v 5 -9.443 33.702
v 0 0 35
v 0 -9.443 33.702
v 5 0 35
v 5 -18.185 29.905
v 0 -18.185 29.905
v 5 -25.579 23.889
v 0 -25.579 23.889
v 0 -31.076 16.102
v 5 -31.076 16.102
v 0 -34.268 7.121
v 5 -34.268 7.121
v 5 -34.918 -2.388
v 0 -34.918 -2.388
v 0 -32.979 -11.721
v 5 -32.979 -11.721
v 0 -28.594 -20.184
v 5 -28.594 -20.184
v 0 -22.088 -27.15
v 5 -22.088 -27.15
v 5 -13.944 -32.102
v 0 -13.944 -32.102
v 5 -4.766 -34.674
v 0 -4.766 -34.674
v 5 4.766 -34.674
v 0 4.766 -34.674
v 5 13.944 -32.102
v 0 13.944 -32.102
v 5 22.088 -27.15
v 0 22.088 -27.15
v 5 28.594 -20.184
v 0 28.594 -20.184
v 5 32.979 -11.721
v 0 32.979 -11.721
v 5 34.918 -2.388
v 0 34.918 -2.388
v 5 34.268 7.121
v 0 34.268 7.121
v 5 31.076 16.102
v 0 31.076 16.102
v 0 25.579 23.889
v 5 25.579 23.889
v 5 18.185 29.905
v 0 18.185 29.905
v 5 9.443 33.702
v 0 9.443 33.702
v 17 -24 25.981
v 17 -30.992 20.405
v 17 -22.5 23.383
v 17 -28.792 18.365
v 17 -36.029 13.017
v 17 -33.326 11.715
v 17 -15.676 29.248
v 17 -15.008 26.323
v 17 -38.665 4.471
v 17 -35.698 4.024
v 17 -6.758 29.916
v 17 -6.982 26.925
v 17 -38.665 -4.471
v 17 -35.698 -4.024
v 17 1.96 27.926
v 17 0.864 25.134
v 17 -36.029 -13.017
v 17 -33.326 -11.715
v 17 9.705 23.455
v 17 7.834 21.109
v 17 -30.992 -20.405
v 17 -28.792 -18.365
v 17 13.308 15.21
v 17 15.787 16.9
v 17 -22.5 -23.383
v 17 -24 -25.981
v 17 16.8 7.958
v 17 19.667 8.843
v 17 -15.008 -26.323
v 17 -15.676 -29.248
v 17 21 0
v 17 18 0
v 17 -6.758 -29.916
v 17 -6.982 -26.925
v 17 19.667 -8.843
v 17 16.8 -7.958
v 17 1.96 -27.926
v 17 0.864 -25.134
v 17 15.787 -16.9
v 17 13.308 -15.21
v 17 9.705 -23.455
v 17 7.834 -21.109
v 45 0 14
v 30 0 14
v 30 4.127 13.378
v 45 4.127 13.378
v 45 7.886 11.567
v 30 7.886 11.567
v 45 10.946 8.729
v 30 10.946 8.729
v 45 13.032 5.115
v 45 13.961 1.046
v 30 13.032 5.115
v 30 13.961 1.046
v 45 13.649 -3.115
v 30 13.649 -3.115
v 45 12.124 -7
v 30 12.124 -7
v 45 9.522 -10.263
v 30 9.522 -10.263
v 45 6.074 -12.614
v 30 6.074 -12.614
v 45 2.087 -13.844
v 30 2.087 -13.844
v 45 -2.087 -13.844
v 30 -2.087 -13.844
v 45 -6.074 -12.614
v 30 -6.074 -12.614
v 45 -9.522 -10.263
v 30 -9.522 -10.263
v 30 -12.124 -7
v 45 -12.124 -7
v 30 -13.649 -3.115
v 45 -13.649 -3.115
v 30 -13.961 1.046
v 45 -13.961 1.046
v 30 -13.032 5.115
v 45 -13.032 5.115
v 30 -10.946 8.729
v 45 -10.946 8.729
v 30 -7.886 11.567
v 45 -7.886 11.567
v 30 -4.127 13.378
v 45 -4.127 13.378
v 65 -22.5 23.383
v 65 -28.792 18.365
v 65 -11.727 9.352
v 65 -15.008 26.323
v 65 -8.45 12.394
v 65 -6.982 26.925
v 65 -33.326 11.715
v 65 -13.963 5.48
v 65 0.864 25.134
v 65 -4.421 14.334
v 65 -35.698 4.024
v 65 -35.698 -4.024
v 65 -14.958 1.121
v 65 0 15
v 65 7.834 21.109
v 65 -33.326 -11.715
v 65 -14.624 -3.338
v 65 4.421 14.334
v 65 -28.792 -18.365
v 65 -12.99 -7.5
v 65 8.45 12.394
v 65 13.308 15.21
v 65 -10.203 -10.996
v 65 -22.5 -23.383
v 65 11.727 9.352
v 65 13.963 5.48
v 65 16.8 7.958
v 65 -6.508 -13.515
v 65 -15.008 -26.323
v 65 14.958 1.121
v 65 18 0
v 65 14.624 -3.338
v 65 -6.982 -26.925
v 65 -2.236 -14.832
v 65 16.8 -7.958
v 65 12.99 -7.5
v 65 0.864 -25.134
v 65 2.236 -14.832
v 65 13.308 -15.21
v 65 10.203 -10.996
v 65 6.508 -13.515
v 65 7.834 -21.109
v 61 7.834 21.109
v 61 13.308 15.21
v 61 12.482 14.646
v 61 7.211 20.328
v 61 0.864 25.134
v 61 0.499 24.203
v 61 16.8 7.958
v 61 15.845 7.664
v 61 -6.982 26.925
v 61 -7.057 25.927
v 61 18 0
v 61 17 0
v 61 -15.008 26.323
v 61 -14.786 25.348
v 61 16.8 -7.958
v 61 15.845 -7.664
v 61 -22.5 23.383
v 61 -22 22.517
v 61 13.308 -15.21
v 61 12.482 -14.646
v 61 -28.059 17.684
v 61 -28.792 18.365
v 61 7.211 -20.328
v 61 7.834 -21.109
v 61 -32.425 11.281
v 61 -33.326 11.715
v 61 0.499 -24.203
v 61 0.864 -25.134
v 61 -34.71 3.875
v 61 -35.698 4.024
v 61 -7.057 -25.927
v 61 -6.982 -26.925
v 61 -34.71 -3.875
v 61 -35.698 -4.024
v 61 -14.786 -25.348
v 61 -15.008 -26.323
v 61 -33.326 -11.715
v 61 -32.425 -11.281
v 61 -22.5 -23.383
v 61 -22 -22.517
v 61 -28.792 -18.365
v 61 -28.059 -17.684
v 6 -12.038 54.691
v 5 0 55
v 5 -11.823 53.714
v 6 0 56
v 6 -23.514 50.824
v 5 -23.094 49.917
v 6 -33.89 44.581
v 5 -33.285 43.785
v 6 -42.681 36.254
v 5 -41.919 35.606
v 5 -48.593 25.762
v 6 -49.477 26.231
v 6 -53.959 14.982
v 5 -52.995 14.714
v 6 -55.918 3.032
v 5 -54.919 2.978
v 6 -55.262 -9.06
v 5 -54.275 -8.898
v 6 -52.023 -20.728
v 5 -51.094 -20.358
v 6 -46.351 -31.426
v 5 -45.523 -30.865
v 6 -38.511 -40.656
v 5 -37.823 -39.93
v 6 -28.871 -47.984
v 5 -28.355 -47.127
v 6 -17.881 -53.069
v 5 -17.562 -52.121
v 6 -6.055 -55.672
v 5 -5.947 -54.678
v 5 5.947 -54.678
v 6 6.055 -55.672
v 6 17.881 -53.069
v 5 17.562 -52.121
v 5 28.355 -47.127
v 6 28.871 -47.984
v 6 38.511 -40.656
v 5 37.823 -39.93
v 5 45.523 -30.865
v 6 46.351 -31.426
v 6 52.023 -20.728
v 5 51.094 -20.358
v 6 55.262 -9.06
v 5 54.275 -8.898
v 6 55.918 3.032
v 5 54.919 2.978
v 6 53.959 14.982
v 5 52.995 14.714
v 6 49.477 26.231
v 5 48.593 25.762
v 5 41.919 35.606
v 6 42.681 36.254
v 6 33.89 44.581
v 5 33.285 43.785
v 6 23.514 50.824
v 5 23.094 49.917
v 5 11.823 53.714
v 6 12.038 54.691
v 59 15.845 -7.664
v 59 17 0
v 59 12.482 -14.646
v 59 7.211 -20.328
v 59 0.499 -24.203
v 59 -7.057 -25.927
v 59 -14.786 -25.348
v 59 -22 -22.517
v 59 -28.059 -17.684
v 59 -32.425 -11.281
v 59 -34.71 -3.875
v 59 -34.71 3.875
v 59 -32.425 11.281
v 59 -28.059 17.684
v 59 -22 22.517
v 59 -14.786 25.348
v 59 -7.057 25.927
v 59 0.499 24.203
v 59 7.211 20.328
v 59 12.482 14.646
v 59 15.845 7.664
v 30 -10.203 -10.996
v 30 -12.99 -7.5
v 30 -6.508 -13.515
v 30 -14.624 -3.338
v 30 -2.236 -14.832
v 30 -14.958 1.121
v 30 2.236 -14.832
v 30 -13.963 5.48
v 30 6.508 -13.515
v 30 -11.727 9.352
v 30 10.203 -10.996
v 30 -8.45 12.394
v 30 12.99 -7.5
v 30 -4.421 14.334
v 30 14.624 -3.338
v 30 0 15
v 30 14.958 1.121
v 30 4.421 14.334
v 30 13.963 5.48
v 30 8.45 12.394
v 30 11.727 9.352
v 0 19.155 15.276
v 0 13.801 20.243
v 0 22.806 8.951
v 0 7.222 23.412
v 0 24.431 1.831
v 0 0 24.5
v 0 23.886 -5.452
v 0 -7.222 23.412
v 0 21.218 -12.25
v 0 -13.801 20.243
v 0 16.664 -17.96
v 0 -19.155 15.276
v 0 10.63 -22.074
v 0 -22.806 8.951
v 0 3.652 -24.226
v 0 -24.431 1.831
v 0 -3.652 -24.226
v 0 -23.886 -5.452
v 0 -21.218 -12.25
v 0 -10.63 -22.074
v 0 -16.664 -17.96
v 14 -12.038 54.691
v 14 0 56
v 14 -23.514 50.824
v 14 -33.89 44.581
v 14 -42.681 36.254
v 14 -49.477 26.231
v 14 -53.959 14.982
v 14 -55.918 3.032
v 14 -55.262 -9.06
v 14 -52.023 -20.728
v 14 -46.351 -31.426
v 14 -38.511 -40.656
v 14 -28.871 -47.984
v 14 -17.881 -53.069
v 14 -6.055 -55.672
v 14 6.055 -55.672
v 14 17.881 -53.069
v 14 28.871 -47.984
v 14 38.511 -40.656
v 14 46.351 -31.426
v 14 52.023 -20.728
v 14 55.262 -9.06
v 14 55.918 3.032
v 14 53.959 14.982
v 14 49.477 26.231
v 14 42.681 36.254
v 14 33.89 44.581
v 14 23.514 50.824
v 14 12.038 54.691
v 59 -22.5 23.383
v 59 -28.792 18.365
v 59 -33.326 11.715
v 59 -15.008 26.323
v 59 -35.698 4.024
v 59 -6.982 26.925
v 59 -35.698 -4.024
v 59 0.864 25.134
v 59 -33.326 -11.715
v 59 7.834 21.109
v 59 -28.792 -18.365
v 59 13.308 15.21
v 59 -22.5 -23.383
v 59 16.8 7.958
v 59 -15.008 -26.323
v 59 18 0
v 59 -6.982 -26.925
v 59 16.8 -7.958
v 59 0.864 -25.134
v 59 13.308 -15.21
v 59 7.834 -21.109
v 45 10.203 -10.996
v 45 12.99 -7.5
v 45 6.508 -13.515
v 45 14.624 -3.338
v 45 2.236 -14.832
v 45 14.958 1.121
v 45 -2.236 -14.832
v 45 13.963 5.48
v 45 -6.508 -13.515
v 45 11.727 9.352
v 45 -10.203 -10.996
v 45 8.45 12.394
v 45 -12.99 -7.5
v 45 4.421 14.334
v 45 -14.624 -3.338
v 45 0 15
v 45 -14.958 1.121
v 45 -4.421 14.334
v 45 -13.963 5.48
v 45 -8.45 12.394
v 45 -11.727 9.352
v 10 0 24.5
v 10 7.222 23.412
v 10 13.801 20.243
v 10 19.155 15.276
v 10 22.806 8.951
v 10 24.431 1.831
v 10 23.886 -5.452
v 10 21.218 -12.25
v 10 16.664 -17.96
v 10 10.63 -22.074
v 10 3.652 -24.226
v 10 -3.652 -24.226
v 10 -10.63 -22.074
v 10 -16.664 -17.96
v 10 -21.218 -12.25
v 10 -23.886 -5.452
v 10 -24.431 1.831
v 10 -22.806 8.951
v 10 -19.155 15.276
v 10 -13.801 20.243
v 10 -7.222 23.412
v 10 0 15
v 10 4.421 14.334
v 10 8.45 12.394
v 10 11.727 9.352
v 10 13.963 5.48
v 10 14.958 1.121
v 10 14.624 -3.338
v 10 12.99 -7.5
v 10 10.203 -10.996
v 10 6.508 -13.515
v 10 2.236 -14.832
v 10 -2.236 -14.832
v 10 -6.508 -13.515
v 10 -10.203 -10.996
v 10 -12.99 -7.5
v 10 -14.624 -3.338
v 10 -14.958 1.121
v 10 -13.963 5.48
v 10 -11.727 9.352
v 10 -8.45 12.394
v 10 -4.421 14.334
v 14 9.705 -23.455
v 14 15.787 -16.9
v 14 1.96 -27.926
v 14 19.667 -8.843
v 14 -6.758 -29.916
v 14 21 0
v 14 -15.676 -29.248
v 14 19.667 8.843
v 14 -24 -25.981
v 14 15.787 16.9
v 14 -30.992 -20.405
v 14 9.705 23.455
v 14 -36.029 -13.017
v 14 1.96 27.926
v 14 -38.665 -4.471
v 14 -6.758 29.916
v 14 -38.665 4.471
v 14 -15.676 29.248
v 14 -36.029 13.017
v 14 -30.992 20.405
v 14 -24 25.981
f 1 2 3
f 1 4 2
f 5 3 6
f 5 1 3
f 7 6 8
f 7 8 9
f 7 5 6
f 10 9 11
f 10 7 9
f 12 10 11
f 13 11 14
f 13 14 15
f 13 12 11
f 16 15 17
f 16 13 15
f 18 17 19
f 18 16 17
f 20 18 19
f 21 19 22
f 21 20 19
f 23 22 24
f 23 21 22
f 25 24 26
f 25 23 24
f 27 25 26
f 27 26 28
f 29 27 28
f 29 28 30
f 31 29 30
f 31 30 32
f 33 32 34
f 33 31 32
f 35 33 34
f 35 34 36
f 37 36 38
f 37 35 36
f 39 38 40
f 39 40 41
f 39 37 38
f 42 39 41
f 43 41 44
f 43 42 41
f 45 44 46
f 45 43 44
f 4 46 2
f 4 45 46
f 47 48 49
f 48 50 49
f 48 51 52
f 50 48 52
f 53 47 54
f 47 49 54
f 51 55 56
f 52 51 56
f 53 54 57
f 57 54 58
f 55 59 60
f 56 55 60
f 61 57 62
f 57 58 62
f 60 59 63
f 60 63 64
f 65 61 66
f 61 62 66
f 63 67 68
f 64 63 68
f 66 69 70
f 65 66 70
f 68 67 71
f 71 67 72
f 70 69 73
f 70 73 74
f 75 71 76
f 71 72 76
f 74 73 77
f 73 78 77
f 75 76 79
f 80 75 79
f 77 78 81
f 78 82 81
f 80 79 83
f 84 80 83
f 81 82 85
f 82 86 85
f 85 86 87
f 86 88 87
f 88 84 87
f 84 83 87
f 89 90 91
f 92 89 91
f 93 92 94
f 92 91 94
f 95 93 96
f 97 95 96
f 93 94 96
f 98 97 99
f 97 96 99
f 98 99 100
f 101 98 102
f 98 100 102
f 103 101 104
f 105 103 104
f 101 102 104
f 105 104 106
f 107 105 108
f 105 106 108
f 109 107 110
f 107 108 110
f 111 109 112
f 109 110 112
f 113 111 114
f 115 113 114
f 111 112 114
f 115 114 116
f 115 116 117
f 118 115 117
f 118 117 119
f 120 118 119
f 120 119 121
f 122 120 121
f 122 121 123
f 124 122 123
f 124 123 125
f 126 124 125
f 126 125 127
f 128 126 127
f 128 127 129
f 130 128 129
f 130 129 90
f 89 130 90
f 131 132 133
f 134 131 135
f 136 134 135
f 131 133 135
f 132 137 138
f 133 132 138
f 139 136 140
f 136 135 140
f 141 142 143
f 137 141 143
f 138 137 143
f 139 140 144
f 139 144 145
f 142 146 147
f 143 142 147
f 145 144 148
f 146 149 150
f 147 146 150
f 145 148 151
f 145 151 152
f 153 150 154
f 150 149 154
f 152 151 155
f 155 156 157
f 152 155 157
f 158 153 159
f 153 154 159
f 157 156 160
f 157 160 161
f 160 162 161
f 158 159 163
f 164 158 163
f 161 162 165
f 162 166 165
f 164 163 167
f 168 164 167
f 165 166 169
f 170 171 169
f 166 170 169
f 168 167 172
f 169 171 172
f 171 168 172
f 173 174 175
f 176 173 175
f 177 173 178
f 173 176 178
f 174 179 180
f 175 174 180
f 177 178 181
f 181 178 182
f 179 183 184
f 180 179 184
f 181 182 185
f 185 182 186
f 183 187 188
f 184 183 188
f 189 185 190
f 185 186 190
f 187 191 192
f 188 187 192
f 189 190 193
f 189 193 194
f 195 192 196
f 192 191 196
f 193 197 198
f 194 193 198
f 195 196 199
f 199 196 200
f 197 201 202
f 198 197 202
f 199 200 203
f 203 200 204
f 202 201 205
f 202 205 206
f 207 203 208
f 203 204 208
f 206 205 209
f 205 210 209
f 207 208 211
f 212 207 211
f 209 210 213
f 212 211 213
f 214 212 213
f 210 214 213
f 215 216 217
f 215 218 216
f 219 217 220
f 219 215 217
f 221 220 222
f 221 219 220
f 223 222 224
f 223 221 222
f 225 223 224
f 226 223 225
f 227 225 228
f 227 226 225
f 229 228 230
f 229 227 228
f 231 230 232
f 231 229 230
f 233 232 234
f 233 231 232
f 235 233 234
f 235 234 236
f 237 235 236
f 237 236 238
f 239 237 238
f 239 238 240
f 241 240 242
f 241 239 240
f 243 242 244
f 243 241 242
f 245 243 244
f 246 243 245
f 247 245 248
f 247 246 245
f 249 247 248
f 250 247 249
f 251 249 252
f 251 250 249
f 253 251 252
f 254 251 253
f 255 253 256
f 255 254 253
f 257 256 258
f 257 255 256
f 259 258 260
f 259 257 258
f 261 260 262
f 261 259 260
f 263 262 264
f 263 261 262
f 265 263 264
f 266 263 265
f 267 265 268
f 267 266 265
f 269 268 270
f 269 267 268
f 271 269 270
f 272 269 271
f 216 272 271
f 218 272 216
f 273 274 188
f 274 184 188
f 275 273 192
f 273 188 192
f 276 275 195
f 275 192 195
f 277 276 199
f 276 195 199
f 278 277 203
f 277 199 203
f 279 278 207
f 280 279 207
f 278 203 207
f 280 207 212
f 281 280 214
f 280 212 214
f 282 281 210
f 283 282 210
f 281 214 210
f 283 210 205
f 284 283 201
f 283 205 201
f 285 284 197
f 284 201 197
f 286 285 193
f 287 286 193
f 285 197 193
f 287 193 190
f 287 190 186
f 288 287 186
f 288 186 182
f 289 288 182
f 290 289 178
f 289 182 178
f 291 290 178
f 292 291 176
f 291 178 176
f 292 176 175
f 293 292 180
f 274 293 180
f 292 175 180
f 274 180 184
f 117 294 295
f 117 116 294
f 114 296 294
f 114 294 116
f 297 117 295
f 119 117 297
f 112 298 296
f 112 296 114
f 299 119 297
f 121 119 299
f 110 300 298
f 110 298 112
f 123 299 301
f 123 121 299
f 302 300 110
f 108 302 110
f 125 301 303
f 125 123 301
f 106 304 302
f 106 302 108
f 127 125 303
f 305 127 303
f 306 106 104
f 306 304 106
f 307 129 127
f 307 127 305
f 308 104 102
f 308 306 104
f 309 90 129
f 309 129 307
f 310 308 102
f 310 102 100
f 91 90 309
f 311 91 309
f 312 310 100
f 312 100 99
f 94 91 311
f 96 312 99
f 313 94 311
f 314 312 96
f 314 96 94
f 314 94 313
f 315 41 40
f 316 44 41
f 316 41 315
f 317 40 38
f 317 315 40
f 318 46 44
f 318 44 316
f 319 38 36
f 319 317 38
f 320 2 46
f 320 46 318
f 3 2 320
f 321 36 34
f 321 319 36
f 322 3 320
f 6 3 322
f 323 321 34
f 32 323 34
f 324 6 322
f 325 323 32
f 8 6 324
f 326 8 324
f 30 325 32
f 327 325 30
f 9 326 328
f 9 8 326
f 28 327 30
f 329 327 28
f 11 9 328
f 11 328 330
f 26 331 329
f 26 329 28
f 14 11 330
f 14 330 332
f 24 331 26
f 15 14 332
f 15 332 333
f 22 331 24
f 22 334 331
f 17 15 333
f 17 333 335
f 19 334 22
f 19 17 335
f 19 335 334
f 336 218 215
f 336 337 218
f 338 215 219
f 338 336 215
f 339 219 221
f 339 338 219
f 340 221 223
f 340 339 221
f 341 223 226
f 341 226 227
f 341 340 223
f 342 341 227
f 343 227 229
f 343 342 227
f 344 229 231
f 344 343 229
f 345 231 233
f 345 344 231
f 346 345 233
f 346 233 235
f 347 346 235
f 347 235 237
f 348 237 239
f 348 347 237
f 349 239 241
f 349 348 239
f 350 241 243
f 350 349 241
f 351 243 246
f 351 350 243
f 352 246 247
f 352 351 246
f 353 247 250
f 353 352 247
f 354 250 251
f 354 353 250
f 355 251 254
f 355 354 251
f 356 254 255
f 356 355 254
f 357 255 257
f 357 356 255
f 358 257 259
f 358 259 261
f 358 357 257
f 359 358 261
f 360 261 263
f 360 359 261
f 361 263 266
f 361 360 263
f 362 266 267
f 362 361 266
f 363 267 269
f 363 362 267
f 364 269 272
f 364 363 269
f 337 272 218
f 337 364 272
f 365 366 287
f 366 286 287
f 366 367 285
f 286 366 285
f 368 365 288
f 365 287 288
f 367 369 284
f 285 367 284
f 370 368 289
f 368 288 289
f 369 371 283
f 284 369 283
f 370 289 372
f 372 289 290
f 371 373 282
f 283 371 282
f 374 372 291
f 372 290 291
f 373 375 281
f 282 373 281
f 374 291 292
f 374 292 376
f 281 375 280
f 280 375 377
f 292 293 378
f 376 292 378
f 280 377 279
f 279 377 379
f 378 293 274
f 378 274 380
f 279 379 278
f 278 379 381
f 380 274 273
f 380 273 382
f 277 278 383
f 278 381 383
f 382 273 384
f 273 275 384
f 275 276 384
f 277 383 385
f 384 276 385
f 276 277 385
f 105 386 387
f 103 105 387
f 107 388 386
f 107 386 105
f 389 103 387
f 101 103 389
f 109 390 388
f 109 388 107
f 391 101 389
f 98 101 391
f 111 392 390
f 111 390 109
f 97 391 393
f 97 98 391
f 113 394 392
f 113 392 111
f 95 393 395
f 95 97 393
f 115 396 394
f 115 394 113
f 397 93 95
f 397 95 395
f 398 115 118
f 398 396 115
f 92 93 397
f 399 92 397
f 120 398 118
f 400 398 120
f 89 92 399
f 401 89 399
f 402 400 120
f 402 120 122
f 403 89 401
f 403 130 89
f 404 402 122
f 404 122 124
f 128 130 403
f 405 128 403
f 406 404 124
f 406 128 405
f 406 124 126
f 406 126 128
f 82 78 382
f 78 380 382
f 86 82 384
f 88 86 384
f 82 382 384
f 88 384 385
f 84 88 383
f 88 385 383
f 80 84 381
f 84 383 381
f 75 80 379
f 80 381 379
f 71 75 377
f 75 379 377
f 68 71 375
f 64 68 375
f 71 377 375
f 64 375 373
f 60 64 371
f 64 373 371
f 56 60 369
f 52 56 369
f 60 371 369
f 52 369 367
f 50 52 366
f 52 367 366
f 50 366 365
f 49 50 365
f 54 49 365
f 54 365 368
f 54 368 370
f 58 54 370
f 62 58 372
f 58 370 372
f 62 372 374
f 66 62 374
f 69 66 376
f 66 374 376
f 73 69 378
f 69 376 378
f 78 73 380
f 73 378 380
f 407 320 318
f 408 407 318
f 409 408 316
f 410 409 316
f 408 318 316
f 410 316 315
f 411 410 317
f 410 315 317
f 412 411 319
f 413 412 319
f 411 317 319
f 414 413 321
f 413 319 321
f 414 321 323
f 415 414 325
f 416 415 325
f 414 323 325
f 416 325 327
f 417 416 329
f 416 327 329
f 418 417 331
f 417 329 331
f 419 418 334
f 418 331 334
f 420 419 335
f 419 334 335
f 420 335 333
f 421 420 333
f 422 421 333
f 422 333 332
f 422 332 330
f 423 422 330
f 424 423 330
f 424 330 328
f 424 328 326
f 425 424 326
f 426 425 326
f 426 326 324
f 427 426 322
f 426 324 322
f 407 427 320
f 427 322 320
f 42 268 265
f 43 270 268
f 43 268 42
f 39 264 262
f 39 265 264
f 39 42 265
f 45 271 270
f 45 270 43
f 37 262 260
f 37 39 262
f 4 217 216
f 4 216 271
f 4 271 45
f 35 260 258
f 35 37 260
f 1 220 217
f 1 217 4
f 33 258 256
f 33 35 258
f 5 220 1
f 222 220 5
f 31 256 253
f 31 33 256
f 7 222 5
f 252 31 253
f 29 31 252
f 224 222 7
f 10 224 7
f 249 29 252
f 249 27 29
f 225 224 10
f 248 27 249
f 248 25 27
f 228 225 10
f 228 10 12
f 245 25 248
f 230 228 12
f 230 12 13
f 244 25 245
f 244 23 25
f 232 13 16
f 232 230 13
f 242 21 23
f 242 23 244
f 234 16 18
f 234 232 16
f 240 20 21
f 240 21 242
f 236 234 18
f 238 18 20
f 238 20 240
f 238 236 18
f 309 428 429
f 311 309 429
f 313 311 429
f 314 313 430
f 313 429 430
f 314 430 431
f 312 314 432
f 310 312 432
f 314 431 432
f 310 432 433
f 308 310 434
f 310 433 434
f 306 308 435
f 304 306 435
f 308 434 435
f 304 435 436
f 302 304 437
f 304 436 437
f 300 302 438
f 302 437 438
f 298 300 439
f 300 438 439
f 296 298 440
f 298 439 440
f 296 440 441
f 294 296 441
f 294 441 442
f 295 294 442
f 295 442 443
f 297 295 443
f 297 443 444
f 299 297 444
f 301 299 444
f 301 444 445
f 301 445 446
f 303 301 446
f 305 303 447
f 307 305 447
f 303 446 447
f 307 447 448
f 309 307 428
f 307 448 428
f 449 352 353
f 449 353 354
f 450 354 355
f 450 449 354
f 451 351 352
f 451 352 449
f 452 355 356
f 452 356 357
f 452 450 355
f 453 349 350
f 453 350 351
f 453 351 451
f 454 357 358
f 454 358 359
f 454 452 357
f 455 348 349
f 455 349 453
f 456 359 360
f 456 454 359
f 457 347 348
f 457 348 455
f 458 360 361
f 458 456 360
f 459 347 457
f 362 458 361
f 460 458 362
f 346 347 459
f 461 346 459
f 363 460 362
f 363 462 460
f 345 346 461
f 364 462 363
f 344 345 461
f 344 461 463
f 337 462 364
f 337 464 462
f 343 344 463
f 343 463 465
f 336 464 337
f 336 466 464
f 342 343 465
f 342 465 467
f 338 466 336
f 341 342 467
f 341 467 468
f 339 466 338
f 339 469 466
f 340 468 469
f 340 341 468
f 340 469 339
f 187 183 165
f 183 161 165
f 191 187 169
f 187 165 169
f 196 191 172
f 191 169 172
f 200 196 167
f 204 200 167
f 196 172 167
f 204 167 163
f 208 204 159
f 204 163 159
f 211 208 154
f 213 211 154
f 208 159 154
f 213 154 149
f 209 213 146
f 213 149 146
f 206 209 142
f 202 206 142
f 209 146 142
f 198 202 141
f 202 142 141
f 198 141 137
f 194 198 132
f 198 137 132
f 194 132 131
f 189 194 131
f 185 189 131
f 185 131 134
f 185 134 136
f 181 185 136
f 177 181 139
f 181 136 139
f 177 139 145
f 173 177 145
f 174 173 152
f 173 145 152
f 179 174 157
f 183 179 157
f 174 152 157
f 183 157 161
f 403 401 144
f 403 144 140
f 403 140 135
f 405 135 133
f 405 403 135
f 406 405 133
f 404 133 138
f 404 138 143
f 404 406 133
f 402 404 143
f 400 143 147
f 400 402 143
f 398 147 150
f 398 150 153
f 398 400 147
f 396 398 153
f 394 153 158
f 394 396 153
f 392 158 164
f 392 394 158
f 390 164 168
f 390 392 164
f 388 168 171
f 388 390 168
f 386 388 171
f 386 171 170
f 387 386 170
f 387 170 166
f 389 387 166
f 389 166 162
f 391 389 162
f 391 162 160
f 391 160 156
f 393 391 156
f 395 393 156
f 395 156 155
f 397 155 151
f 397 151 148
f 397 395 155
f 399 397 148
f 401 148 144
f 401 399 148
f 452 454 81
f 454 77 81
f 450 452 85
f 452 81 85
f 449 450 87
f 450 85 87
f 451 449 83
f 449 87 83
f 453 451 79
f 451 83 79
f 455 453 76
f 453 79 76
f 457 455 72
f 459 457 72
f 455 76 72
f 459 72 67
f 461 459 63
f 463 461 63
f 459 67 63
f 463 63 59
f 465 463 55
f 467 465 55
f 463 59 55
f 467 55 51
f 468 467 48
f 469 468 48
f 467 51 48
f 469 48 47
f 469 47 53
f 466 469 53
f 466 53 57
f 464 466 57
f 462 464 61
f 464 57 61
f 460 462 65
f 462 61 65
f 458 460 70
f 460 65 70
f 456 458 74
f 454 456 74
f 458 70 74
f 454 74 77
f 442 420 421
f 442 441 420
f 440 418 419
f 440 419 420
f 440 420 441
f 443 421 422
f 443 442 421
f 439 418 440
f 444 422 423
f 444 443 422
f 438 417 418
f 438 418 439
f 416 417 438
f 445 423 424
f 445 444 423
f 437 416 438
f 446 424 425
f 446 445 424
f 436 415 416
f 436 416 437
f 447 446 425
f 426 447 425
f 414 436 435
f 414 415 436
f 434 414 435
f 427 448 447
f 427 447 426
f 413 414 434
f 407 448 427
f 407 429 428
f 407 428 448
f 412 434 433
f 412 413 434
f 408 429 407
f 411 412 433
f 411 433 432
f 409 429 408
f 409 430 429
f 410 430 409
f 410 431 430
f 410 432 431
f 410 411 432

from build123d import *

# Parameters (mm, degrees)
ESQUISSE2_R             = 24.5
ENL_V_MAT_EXTRU_1_DEPTH = 10
ESQUISSE4_R             = 14
ENL_V_MAT_EXTRU_2_DEPTH = 97.42095208
ESQUISSE5_R             = 15
ENL_V_MAT_EXTRU_3_DEPTH = 20
ENL_V_START             = -20
ESQUISSE6_R             = 15
ENL_V_MAT_EXTRU_4_DEPTH = 20


with BuildPart() as part:
    # Esquisse1 → Révolution1 (revolve)
    with BuildSketch(Plane.XY, mode=Mode.PRIVATE) as r_volution1_sk:
        Polygon((0, 0), (0, 35), (5, 35), (5, 55), (6, 56), (14, 56), (14, 0), align=None)
    revolve(r_volution1_sk.sketch.rotate(Axis((0, 0, 0), (1, 0, 0)), 90), axis=Axis((0, 0, 0), (1, 0, 0)))

    # Esquisse2 → Enlèv. mat.-Extru.1 (cut)
    with BuildSketch(Plane.ZY):
        Circle(ESQUISSE2_R)
    extrude(amount=-ENL_V_MAT_EXTRU_1_DEPTH, mode=Mode.SUBTRACT)

    # Esquisse3 → Révolution2 (revolve)
    with BuildSketch(Plane.XY):
        Polygon((14, 21), (17, 21), (17, 18), (59, 18), (59, 17), (61, 17), (61, 18), (65, 18), (65, -9), (14, -9), align=None)
    revolve(axis=Axis((58.599942934, -9, 0), (-1, 0, 0)))

    # Esquisse4 → Enlèv. mat.-Extru.2 (cut, through all)
    with BuildSketch(Plane.ZY.offset(-10)):
        Circle(ESQUISSE4_R)
    extrude(amount=-ENL_V_MAT_EXTRU_2_DEPTH, mode=Mode.SUBTRACT)

    # Esquisse5 → Enlèv. mat.-Extru.3 (cut)
    with BuildSketch(Plane.ZY.offset(-10)):
        Circle(ESQUISSE5_R)
    extrude(amount=-ENL_V_MAT_EXTRU_3_DEPTH, mode=Mode.SUBTRACT)

    # Esquisse6 → Enlèv. mat.-Extru.4 (cut)
    with BuildSketch(Plane(origin=(65, 0, 0), x_dir=(0, 0, -1), z_dir=(1, 0, 0)).offset(ENL_V_START)):
        with Locations(Location((0, 0, 0), (0, 0, 180))):
            Circle(ESQUISSE6_R)
    extrude(amount=ENL_V_MAT_EXTRU_4_DEPTH, mode=Mode.SUBTRACT)


solid = part.part
